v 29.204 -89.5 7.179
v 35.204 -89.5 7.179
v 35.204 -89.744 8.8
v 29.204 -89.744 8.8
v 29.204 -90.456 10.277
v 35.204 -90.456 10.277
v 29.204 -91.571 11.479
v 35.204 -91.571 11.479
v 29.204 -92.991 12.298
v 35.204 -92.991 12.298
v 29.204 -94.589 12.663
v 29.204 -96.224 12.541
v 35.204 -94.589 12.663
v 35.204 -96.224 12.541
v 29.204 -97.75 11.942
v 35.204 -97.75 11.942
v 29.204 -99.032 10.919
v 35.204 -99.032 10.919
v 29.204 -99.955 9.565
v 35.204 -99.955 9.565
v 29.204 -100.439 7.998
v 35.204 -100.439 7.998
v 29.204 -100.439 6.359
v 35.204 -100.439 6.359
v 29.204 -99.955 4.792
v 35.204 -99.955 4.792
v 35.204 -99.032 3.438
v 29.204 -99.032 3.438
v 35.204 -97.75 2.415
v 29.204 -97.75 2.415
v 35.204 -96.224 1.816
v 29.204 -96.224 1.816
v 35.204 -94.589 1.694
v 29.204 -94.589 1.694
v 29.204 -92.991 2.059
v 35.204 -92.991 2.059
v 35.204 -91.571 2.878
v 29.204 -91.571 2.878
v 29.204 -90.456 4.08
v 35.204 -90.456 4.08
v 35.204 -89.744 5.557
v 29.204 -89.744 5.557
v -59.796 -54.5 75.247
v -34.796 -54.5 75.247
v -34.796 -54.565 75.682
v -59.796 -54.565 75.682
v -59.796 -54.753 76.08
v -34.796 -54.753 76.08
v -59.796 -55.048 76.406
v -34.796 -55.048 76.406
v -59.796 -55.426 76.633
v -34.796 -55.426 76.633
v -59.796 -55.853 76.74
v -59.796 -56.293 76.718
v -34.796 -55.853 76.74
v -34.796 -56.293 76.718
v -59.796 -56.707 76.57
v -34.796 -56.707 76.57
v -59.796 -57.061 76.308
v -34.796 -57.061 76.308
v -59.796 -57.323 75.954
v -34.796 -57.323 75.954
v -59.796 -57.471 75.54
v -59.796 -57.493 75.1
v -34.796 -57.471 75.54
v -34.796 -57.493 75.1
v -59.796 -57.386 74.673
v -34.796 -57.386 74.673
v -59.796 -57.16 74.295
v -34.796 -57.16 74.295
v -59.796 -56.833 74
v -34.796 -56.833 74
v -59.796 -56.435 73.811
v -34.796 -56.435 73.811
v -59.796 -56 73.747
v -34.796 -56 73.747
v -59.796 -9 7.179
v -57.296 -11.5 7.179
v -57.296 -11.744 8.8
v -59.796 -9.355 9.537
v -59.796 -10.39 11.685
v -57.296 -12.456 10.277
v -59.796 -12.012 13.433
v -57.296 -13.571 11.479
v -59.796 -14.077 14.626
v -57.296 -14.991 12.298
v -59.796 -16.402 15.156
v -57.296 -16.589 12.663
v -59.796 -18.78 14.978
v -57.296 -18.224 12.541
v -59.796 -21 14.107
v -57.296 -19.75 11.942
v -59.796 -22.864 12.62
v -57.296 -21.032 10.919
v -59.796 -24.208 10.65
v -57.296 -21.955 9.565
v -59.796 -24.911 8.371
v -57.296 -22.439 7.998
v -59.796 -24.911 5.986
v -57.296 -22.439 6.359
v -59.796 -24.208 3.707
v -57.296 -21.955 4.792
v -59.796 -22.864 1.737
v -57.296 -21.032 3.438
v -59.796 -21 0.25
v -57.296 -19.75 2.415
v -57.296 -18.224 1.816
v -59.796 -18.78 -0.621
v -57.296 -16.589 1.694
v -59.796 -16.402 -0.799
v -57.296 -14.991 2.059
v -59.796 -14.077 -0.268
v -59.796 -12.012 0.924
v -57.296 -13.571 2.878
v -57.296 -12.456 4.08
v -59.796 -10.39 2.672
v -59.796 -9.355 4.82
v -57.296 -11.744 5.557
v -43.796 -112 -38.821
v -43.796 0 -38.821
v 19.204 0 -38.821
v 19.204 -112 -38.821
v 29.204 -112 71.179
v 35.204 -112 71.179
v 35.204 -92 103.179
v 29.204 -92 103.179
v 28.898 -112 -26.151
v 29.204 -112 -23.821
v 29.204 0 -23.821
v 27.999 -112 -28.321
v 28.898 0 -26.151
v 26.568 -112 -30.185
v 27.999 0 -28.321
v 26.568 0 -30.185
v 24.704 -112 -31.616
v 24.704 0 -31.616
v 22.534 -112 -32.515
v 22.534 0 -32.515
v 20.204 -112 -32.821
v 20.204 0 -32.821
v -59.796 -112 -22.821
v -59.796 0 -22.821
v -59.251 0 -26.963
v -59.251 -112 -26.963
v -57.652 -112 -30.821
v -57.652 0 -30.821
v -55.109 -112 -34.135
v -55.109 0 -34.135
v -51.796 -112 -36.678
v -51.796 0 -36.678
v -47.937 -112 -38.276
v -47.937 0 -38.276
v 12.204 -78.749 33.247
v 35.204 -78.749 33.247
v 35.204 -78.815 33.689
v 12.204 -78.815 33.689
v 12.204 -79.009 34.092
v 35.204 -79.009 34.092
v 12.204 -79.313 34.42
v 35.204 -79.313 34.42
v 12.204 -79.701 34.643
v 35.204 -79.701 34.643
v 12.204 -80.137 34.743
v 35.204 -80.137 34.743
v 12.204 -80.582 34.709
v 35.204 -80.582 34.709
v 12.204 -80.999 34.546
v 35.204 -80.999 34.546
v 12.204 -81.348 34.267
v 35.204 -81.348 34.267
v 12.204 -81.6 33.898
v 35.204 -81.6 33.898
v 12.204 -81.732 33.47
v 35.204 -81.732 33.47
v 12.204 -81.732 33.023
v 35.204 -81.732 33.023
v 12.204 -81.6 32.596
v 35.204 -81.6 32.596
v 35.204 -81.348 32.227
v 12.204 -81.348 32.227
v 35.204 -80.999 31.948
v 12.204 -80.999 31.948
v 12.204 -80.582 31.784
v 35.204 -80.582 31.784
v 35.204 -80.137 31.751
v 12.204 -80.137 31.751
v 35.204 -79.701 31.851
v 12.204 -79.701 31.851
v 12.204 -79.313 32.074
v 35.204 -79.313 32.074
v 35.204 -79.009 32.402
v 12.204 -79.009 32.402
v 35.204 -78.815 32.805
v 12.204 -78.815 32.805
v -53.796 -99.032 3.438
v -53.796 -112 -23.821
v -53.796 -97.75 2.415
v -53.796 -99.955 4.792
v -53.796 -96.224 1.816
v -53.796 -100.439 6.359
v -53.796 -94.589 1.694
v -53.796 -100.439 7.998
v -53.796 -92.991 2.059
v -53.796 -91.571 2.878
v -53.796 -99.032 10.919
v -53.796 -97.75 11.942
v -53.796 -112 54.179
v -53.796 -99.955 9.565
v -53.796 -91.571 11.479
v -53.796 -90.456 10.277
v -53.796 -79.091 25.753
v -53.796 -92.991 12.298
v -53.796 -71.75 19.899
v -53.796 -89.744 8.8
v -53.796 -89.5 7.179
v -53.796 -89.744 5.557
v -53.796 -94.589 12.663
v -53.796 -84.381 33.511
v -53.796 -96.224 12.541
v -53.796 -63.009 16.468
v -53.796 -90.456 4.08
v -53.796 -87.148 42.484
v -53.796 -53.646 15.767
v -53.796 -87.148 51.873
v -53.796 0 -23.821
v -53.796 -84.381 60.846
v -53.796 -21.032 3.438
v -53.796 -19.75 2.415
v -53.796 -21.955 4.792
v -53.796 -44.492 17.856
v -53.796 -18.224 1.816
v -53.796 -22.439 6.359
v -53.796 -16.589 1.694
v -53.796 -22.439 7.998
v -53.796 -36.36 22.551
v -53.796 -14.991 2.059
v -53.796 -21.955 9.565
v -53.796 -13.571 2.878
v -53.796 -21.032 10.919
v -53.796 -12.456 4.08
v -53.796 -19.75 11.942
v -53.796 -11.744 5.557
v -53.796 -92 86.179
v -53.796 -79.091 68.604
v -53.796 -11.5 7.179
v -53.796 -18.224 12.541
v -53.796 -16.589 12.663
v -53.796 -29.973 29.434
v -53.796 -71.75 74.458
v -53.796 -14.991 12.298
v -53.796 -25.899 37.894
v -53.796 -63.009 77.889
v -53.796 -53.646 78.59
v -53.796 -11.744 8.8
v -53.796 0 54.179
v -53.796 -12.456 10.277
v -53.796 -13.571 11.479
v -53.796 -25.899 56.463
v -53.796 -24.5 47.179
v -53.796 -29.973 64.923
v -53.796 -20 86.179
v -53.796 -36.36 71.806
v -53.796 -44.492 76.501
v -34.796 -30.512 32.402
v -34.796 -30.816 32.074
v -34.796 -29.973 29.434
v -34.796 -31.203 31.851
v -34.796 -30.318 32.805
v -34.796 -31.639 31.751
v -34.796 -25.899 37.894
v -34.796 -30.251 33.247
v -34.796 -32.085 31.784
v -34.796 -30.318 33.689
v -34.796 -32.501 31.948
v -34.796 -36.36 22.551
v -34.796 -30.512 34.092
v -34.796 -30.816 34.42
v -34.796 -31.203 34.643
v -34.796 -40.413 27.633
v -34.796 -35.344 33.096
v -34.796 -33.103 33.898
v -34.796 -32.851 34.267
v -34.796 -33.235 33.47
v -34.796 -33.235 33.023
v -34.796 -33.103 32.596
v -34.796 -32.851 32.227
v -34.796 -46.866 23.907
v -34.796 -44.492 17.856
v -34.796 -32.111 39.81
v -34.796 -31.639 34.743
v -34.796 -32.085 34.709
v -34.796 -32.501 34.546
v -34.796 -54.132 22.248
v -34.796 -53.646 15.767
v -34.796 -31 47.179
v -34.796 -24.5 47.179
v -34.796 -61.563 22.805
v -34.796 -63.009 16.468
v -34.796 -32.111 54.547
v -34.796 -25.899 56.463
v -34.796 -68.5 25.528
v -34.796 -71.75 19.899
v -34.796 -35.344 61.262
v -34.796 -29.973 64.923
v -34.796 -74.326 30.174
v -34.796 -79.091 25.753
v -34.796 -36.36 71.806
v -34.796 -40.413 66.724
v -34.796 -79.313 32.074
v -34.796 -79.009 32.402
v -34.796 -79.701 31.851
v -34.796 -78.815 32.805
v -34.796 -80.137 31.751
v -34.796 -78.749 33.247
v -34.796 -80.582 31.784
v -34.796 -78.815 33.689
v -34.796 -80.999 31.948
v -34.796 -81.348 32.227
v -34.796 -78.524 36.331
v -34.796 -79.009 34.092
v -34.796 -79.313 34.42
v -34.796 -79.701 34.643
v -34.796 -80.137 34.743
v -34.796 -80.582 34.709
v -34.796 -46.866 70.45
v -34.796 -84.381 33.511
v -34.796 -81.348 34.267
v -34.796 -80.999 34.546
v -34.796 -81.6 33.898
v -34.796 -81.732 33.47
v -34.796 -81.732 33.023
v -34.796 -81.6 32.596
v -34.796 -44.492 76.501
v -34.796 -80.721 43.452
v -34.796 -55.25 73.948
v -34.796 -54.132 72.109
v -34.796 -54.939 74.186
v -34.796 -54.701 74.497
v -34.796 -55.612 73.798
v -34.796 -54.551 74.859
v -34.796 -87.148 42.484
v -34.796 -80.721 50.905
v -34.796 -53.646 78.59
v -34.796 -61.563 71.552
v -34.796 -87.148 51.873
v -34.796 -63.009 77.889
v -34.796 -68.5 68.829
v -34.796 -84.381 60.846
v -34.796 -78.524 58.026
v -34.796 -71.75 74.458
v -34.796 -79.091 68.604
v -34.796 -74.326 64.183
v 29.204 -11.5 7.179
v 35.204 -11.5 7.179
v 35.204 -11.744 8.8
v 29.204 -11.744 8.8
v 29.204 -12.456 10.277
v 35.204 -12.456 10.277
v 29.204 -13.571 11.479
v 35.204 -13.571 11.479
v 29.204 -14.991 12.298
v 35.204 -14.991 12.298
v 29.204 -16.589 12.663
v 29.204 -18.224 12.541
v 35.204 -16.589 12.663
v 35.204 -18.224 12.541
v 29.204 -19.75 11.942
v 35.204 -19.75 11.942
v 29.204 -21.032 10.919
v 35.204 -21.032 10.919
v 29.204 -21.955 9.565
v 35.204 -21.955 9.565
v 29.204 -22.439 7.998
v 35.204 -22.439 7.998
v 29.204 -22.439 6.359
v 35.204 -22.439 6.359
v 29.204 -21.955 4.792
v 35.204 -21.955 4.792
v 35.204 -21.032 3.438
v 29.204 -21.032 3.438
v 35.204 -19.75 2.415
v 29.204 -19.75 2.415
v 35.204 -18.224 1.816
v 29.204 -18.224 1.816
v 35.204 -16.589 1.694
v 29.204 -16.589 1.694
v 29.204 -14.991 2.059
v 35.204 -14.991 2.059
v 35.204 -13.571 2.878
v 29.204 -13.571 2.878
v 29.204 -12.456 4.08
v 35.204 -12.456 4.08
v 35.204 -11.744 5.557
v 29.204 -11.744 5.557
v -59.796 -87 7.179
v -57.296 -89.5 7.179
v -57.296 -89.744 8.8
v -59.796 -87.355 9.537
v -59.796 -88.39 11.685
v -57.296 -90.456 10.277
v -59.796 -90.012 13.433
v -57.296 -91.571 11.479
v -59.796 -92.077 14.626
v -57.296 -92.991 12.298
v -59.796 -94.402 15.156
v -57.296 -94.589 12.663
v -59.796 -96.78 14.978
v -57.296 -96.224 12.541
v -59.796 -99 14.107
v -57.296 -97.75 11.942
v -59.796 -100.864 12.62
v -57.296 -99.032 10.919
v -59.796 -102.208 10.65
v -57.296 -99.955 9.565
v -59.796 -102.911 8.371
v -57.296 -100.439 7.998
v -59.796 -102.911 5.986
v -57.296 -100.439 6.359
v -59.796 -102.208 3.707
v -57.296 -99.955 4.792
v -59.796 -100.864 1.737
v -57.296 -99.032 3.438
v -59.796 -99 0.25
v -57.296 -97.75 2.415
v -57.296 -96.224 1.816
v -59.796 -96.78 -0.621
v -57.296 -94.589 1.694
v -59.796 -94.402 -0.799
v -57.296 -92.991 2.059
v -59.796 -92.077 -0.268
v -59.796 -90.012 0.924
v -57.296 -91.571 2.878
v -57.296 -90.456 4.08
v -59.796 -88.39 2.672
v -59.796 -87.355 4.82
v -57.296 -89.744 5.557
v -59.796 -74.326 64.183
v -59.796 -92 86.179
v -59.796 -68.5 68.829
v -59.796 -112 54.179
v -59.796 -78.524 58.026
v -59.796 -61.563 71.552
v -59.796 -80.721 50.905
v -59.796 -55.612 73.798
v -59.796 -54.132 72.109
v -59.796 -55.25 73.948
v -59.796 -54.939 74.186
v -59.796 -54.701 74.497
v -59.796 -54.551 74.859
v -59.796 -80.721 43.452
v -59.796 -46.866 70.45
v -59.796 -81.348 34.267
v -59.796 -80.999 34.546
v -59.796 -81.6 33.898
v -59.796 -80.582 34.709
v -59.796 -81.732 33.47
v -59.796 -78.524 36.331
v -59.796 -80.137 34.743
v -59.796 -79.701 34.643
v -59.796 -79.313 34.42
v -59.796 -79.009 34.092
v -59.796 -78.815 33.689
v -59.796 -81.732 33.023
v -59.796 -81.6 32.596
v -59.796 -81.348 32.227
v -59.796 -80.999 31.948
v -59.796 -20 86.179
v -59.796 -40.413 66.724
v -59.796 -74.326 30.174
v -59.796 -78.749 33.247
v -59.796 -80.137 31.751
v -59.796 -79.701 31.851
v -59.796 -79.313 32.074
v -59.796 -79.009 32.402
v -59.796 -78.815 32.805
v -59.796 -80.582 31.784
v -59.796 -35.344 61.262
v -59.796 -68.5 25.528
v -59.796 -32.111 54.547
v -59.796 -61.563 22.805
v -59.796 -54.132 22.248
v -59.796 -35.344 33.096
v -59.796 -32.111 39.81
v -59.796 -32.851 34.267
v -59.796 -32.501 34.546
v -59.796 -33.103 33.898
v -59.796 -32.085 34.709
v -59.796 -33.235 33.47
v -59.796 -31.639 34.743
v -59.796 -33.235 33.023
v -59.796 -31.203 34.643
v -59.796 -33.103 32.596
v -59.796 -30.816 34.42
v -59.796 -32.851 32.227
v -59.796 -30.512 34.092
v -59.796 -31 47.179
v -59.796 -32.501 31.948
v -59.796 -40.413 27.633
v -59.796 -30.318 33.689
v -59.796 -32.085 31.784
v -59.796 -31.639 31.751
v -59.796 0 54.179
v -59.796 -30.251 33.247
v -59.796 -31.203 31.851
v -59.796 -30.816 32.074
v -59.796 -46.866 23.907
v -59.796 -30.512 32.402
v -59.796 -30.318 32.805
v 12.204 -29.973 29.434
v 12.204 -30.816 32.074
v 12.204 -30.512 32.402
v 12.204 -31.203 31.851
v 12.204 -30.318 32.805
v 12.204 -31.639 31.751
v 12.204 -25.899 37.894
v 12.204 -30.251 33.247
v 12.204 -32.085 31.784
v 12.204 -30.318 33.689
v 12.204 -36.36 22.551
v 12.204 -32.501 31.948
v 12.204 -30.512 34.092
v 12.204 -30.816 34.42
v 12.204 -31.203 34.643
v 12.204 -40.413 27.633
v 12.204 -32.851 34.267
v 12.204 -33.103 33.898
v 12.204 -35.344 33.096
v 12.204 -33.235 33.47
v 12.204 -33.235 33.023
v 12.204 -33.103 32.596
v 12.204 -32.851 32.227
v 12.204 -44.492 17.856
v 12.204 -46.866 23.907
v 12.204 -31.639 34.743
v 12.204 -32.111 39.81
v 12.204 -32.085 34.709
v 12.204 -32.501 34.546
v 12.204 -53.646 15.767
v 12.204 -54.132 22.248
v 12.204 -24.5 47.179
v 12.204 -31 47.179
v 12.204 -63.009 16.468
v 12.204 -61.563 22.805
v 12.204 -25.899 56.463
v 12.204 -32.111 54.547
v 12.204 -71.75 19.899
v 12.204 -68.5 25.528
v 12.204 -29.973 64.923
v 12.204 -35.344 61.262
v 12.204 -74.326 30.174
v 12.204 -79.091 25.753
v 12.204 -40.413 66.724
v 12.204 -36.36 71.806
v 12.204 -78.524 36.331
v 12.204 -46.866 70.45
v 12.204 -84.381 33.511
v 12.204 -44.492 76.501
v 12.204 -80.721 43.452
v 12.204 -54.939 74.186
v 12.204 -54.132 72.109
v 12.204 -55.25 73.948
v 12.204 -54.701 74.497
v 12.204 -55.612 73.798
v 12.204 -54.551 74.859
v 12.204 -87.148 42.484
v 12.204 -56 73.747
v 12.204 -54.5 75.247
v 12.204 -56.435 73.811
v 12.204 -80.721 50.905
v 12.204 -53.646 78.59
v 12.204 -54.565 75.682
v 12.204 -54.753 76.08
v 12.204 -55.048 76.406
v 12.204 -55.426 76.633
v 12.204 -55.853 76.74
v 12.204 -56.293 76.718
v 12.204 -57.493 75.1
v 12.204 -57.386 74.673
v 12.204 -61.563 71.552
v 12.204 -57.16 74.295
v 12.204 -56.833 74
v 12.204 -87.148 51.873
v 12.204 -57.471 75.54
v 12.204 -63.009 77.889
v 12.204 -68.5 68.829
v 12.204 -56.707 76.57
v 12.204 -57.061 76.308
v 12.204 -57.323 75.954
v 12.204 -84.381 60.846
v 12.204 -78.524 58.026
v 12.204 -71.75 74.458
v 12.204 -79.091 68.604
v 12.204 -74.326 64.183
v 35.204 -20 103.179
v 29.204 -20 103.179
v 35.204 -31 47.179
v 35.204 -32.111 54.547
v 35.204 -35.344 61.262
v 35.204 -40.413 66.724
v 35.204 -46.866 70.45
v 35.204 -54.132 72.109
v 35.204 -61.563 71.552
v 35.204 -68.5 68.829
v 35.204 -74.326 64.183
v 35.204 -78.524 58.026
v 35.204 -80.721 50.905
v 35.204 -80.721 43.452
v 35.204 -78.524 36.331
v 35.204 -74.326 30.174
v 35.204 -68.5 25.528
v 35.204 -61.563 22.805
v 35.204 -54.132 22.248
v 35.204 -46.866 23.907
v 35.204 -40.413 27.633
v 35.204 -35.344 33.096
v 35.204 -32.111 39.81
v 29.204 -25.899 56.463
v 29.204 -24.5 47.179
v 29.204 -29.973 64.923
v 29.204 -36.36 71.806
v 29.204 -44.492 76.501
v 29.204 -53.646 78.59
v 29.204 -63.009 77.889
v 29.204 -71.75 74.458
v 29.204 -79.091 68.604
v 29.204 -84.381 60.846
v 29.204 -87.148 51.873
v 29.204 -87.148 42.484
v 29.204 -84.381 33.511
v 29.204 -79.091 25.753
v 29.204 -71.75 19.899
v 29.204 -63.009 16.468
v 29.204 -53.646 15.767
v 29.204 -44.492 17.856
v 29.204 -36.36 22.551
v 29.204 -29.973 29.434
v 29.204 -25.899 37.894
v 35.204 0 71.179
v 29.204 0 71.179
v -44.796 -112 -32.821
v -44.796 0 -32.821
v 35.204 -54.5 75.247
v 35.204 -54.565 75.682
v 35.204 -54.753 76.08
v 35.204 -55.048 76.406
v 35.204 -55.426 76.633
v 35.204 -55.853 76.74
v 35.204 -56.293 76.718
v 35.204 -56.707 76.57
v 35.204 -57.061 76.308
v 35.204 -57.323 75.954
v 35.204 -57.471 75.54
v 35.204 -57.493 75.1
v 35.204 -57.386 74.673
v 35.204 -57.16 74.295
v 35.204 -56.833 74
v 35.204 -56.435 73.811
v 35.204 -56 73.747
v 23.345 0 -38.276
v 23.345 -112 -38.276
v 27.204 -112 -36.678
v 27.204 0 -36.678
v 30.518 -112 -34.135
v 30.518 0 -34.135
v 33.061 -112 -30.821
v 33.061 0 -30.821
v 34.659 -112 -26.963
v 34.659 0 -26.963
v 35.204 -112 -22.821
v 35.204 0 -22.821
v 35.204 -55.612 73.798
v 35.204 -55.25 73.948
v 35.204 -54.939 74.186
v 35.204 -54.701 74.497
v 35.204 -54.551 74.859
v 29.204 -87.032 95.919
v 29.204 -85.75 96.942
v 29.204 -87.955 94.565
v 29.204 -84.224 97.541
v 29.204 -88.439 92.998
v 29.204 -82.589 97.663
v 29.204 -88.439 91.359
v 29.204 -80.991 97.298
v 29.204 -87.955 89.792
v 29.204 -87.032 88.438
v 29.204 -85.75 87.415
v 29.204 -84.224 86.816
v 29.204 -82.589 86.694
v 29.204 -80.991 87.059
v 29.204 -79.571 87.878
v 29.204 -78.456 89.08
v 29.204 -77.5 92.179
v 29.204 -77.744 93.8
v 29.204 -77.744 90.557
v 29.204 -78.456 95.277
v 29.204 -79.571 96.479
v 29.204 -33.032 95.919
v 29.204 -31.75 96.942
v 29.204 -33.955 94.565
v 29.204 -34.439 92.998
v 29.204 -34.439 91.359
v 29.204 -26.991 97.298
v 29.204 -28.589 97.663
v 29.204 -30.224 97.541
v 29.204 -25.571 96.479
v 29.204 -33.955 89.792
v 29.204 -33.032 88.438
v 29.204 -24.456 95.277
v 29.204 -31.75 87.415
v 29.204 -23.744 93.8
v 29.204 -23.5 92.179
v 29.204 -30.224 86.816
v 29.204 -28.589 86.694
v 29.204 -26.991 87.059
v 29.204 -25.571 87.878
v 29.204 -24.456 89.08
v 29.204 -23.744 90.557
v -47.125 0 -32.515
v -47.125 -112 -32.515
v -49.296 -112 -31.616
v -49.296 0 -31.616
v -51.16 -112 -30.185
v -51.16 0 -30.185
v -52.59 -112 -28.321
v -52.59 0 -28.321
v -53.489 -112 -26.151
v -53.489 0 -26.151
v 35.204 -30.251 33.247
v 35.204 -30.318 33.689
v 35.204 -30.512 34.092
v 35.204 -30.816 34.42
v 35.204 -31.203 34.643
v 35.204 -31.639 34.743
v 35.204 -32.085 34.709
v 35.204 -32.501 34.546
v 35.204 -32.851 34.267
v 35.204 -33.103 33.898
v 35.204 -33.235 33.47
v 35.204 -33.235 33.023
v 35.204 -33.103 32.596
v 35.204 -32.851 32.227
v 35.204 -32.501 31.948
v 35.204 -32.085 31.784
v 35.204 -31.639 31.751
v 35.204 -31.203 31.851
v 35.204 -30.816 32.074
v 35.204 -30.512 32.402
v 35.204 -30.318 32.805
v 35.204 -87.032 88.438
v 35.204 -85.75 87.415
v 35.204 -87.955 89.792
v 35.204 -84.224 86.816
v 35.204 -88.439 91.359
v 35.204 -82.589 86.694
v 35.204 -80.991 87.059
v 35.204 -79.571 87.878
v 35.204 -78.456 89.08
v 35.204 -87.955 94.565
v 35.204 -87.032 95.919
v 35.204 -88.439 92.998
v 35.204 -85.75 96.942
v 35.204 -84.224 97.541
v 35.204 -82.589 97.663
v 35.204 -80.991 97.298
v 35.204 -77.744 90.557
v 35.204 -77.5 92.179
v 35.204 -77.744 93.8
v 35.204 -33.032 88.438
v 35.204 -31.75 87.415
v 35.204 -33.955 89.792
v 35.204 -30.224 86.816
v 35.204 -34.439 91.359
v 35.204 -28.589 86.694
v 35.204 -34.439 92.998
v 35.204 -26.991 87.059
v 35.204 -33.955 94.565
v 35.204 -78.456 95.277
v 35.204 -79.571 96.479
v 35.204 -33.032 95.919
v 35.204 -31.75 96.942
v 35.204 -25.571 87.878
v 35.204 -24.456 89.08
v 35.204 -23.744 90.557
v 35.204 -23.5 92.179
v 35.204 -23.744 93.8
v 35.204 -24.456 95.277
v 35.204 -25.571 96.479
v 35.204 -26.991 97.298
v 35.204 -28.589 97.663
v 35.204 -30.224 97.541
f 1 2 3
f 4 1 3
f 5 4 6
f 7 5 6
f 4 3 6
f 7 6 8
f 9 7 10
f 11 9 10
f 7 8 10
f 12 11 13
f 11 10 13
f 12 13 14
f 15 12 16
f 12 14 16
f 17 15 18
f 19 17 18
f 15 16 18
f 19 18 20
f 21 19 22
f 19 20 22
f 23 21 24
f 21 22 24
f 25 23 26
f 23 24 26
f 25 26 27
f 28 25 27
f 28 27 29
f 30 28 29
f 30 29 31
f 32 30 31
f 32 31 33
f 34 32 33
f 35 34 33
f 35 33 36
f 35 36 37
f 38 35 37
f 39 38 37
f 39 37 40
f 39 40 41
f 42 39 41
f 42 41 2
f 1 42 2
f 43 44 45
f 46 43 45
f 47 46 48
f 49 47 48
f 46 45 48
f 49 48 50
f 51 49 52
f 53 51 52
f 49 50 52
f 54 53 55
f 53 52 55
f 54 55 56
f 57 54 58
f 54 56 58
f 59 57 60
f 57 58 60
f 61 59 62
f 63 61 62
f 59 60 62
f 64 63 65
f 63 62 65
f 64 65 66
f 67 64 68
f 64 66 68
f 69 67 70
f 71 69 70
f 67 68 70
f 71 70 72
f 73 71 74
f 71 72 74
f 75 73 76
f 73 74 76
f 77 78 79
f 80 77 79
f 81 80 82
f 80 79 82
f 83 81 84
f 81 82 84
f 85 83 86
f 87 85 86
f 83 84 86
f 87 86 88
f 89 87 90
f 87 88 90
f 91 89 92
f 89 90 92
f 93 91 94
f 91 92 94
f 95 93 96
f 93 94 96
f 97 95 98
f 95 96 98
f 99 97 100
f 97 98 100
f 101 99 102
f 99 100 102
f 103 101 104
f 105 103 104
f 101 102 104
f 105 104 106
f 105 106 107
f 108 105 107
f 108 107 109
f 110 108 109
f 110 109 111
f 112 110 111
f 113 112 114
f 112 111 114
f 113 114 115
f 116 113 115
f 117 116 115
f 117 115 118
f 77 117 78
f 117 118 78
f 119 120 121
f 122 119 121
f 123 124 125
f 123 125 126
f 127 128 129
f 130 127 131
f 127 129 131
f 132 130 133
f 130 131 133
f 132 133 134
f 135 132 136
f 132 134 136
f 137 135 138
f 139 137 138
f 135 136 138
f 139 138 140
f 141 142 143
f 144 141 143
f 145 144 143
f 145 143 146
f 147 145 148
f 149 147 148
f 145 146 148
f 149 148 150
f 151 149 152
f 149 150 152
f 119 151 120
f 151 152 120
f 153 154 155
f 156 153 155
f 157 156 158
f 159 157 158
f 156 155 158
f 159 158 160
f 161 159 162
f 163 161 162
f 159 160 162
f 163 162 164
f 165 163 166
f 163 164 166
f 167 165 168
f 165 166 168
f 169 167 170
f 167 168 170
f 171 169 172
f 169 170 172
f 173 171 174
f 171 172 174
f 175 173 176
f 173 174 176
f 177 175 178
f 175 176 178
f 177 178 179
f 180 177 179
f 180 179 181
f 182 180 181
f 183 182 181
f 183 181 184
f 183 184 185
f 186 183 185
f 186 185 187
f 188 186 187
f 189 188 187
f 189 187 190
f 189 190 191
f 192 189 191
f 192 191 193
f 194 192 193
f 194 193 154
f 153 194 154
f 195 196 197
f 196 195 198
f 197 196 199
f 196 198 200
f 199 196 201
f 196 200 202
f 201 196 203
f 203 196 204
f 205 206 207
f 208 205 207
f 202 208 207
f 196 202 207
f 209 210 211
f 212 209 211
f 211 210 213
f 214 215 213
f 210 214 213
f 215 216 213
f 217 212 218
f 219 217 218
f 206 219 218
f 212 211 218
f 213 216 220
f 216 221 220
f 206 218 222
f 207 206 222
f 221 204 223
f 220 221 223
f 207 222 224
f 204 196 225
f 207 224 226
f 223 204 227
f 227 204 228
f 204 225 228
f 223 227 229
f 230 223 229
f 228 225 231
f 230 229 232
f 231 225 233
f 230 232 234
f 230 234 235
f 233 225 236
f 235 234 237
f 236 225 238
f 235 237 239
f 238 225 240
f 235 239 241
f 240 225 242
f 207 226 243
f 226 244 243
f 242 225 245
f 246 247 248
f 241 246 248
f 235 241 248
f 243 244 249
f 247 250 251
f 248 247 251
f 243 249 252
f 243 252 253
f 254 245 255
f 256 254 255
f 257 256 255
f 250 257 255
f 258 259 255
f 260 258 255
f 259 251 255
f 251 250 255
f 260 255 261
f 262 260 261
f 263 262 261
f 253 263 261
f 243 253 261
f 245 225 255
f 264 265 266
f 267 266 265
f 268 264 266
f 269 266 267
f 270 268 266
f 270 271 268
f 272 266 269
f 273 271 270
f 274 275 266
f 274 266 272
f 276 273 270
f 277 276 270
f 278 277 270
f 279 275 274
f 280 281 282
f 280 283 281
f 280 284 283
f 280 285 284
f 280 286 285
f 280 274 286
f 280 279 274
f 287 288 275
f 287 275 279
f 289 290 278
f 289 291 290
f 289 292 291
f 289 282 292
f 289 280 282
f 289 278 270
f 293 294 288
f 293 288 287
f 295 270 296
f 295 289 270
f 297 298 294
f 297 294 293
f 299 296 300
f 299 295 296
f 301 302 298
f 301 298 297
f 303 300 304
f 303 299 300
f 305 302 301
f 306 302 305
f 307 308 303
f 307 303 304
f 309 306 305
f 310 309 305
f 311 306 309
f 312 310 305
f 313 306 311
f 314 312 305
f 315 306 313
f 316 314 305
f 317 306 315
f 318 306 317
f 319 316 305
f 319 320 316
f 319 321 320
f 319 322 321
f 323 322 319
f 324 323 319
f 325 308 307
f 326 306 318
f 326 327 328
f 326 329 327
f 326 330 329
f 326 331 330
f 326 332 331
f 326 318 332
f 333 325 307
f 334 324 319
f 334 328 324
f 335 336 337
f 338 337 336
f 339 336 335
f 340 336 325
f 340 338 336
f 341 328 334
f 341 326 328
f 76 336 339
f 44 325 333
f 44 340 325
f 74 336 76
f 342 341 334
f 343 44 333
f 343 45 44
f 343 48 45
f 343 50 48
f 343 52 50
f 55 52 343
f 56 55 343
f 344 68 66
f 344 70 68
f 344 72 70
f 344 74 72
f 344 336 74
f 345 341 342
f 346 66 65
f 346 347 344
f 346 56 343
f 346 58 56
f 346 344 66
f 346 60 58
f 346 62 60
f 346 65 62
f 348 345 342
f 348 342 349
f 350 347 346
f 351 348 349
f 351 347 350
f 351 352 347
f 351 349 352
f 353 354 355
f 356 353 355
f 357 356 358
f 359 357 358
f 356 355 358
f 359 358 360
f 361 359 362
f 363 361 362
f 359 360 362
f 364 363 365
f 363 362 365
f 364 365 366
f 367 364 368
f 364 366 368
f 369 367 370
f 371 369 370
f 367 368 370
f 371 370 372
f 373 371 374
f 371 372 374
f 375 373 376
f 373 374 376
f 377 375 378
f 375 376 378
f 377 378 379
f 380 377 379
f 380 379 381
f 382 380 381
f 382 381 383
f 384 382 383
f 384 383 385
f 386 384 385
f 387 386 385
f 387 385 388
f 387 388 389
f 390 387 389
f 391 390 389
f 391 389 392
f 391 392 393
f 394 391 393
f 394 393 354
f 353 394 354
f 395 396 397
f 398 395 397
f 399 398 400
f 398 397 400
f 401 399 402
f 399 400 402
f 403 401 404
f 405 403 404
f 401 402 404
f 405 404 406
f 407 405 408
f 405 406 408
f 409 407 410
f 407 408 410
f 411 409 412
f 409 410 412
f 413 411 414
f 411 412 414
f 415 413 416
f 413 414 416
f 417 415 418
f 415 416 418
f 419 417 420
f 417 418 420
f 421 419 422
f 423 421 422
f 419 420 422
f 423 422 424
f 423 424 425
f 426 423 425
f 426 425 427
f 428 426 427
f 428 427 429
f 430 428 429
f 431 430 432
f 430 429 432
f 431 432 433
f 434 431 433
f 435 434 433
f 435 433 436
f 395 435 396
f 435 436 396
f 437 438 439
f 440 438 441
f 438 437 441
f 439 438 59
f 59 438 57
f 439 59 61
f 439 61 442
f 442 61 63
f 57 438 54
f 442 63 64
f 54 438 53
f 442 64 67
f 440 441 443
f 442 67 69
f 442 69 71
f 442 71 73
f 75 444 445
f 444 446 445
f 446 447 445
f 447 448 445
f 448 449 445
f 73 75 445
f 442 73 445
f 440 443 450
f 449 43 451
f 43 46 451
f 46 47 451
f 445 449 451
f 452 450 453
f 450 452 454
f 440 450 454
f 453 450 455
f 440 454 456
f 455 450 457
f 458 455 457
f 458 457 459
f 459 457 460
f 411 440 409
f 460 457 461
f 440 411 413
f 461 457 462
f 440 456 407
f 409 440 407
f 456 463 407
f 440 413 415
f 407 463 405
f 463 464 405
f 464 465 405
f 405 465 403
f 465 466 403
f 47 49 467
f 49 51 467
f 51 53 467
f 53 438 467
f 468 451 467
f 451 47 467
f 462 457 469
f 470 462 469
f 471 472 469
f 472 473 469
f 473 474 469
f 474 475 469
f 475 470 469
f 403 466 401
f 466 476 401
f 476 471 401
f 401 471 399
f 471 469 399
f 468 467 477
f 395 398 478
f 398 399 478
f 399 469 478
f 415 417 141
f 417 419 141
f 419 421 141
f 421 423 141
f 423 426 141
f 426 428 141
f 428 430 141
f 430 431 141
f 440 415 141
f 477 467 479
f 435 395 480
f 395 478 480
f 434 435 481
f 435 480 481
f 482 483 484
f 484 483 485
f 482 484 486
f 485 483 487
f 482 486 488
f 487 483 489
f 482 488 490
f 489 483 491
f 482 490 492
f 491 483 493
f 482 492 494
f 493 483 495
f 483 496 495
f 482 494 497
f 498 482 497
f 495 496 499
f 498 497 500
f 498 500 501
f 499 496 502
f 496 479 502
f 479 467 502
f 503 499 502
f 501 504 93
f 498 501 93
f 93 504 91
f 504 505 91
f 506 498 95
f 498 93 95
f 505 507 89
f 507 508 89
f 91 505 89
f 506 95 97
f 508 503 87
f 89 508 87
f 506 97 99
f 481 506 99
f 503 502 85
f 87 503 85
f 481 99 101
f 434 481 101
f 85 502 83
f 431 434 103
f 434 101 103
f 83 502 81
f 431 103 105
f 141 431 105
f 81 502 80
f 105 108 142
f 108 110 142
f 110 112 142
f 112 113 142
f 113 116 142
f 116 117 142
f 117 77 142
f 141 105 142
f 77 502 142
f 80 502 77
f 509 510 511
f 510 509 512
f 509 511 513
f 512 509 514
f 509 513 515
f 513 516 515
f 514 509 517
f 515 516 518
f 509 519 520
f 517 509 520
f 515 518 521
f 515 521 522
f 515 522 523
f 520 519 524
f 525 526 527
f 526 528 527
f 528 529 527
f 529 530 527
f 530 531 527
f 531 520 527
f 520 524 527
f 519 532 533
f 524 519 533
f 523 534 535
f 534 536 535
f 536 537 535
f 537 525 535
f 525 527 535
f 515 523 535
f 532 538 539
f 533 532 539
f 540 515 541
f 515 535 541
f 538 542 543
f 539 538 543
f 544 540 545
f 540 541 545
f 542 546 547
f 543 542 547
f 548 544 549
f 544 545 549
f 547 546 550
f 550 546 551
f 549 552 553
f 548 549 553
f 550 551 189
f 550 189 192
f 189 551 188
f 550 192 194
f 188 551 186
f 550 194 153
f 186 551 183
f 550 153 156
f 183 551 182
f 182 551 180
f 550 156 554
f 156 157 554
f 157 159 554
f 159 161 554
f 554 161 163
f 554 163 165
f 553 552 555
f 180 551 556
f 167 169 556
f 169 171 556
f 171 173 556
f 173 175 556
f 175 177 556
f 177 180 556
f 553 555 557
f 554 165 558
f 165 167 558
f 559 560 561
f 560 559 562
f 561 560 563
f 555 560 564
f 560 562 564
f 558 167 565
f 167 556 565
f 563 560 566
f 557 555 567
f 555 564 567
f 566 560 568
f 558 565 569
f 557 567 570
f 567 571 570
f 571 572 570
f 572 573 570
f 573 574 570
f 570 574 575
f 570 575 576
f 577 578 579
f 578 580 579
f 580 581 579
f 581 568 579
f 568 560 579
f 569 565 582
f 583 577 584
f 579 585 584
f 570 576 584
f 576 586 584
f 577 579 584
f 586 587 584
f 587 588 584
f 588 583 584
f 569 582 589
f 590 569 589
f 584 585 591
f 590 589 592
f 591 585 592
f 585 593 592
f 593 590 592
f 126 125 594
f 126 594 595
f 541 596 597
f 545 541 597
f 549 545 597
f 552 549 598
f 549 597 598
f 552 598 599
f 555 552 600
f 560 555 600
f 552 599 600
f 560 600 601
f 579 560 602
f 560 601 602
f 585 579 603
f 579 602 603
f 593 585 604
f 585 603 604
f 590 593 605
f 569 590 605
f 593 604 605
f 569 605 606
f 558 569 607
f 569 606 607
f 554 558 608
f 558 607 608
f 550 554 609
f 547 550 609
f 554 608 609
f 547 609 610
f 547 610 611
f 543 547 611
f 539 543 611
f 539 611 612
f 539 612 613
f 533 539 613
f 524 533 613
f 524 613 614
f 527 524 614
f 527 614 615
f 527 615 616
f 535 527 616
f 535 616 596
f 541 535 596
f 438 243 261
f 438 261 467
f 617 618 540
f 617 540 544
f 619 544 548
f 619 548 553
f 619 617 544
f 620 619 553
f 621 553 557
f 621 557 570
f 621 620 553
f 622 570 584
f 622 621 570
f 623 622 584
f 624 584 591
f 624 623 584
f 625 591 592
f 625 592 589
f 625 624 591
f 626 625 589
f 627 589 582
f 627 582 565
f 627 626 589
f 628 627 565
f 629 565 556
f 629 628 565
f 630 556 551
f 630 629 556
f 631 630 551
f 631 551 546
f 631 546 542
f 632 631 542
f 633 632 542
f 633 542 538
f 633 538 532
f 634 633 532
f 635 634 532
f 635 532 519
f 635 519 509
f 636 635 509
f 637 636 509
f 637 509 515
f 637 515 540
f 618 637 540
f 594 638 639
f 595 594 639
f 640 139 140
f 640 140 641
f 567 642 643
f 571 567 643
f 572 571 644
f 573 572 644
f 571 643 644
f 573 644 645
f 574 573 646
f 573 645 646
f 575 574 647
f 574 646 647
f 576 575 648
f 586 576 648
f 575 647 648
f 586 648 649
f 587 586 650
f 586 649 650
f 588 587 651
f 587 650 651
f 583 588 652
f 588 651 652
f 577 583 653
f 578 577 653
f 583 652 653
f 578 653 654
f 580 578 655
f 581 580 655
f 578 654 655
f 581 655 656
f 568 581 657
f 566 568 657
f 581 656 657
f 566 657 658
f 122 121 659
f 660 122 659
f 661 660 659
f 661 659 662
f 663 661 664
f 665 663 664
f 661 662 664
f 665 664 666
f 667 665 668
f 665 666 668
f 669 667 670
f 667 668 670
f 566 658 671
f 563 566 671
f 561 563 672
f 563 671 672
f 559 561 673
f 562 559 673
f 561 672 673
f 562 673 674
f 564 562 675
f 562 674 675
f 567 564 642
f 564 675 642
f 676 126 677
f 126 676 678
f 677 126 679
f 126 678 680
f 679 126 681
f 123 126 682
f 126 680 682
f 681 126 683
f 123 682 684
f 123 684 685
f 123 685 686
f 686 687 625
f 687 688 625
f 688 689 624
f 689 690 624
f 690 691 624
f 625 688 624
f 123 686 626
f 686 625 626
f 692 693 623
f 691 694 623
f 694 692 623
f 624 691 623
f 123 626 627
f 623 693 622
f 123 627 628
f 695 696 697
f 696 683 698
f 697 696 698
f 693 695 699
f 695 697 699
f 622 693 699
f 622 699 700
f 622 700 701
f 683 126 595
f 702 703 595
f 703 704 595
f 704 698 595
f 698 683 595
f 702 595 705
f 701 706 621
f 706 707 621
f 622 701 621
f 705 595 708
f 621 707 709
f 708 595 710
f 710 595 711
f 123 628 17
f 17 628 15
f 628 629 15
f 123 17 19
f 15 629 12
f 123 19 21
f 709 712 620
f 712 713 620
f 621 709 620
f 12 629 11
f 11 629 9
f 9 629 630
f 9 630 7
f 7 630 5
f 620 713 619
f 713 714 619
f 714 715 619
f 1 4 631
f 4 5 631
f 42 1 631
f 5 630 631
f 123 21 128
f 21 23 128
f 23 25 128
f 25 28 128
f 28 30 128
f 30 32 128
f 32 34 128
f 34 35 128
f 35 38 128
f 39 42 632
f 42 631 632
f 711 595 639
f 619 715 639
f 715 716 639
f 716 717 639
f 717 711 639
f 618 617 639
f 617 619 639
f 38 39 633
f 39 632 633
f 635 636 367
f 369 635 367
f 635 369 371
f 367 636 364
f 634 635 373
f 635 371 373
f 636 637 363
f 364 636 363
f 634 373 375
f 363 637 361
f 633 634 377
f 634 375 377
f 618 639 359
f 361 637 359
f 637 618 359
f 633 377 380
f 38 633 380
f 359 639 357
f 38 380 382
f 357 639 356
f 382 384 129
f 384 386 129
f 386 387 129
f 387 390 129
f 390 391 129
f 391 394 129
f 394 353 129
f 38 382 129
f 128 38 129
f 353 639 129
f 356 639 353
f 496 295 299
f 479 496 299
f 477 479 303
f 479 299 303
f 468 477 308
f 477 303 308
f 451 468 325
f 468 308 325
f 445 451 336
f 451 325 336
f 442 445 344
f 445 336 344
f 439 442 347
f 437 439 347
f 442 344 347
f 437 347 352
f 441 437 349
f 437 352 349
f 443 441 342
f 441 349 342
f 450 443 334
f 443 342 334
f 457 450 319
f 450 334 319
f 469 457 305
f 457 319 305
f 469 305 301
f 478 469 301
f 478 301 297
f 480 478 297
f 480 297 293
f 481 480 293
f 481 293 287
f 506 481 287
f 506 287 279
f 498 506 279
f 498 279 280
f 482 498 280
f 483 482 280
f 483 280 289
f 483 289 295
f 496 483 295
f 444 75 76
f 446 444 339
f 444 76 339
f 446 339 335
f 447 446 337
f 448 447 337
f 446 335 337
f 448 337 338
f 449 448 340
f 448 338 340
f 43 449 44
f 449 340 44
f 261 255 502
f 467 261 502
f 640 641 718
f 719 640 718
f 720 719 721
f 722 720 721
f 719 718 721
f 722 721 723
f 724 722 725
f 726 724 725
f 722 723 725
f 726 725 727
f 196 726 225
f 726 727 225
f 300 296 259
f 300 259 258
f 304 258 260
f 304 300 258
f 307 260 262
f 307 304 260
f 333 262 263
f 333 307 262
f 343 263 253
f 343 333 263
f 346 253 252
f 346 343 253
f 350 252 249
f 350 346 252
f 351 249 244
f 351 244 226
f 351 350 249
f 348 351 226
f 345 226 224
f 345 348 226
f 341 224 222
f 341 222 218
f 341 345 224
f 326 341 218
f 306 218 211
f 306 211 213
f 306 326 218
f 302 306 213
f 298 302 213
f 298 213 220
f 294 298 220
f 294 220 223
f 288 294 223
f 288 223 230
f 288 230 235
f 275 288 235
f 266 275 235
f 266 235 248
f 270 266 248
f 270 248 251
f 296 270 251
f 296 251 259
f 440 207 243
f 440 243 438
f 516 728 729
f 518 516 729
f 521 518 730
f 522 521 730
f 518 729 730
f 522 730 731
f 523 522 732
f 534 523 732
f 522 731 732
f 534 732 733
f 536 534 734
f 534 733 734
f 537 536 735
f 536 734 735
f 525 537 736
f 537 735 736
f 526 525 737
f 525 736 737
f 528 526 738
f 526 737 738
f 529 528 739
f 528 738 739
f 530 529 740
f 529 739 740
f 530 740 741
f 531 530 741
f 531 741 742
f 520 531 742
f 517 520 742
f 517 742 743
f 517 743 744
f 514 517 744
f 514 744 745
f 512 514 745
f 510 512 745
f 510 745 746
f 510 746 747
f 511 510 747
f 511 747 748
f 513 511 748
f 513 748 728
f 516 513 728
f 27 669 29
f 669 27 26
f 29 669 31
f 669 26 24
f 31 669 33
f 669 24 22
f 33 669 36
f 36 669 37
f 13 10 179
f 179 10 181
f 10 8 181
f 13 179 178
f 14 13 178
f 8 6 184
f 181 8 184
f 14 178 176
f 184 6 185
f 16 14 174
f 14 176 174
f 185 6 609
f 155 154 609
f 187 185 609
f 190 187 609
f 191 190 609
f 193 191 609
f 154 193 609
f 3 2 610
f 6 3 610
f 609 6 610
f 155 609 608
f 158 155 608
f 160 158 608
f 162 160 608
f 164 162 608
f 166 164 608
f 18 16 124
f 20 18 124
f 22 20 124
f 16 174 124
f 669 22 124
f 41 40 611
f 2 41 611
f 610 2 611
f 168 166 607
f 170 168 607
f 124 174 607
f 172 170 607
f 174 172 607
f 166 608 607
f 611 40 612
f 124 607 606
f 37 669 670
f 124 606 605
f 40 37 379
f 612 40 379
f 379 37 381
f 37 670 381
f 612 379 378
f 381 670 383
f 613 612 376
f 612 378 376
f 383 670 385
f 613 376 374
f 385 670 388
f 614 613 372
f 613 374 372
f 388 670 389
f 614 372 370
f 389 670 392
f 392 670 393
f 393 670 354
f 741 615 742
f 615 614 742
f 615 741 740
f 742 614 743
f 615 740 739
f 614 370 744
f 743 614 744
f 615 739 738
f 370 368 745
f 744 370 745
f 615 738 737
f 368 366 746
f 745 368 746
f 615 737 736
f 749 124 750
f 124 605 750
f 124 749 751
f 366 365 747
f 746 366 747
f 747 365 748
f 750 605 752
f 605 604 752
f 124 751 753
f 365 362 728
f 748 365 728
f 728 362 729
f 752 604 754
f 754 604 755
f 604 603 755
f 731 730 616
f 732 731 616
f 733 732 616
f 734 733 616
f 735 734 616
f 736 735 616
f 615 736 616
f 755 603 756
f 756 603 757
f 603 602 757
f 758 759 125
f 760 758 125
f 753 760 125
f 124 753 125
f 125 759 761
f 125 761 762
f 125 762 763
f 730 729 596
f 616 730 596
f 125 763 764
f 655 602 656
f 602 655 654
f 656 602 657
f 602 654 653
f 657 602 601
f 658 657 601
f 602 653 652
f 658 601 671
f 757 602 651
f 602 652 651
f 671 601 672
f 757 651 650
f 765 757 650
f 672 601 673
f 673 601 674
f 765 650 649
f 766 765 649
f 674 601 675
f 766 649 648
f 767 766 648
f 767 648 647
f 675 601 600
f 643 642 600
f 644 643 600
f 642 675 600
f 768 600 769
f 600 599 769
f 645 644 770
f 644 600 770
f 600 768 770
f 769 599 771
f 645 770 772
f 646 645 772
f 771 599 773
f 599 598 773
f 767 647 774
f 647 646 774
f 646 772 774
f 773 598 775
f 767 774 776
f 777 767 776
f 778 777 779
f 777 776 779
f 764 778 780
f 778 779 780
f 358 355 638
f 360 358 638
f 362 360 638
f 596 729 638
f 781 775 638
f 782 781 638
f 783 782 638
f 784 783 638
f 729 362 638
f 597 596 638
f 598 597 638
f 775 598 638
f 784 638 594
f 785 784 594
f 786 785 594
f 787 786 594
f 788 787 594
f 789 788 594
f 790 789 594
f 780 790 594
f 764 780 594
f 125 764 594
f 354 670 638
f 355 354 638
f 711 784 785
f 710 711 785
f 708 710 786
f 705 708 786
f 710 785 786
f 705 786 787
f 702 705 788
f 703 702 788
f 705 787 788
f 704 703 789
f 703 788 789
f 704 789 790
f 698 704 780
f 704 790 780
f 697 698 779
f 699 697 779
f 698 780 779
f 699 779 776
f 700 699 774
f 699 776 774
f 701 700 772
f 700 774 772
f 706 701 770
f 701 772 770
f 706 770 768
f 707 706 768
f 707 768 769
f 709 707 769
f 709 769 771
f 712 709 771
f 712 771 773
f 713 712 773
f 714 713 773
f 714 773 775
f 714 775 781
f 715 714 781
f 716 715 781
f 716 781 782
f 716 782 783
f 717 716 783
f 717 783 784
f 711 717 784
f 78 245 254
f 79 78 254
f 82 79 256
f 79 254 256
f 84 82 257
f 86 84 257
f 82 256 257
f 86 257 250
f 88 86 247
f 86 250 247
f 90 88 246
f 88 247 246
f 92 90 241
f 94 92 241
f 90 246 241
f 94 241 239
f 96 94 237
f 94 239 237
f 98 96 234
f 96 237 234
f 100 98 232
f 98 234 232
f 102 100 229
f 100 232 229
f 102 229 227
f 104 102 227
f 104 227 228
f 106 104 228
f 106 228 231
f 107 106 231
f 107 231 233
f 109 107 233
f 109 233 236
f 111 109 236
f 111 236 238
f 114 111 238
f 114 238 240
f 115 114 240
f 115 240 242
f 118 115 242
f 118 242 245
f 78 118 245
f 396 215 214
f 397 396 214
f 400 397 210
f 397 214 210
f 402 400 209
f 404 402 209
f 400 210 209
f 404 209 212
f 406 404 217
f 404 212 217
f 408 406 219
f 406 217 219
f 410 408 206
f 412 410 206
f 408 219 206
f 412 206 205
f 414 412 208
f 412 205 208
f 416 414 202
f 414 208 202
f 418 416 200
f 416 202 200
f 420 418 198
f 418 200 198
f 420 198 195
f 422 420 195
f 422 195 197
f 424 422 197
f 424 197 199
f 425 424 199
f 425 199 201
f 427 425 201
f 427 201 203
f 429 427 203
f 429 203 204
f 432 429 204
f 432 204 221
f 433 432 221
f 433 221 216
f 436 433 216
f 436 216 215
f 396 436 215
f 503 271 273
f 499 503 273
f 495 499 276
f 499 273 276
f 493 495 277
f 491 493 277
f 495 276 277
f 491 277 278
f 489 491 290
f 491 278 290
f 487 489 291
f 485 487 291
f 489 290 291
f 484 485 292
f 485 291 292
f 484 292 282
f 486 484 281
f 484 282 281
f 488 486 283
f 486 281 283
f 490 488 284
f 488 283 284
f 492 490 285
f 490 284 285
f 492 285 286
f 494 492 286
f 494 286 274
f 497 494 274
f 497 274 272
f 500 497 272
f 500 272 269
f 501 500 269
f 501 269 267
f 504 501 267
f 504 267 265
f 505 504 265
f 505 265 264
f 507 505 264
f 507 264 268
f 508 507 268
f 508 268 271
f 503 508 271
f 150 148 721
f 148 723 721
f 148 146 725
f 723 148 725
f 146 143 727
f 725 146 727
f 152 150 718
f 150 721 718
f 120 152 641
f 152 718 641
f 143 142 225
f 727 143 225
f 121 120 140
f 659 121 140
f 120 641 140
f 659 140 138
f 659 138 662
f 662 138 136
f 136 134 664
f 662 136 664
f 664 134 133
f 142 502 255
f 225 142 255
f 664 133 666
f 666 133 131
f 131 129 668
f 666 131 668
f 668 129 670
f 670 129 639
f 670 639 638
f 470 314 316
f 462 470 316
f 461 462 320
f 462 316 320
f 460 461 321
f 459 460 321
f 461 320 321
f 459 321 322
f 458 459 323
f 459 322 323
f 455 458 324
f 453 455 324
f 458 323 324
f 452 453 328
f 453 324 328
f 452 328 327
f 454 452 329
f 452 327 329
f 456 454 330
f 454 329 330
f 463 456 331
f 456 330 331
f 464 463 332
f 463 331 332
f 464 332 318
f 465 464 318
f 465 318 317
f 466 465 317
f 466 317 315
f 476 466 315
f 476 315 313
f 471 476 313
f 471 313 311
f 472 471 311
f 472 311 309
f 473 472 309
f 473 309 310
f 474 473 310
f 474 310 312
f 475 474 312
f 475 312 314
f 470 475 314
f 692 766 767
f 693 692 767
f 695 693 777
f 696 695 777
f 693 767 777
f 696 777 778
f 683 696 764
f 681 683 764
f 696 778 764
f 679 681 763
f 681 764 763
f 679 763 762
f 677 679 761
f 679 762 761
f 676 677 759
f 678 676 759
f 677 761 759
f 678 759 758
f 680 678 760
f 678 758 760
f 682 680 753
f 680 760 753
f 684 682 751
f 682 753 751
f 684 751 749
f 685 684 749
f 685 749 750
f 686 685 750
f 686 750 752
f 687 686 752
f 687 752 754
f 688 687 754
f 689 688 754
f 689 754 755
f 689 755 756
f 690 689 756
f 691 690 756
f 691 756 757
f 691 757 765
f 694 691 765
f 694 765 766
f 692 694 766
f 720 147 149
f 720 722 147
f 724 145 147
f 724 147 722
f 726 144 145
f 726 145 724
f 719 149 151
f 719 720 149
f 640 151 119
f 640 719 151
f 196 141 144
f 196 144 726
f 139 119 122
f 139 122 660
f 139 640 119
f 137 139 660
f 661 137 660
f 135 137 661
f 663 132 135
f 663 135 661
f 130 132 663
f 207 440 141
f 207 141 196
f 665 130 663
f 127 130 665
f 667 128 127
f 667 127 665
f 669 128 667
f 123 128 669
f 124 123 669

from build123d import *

# Parameters (mm, degrees)
F1_DEPTH    = 112
F2_R        = 25
F3_DEPTH    = 185
F2_R_2      = 31.5
F5_DEPTH    = 184
F6_DEPTH    = 95
F7_W        = 47
F7_H        = 100
F8_DEPTH    = 159
F9_R        = 5.5
F10_DEPTH   = 157.2
F9_R_2      = 1.5
F11_DEPTH   = 154.4
F12_SIZE2   = 32
F12_SIZE    = 20
F12_2_SIZE2 = 32
F12_2_SIZE  = 20
F13_SIZE    = 2.5


with BuildPart() as f1:
    # F0 (on Front) → F1 (new body)
    with BuildSketch(Plane.XZ):
        with BuildLine():
            ThreePointArc((-59.7957043946, -22.8214863997), (-55.1094128936, -34.1351948987), (-43.7957043946, -38.8214863997))
            Line((-43.7957043946, -38.8214863997), (19.2042956054, -38.8214863997))
            ThreePointArc((19.2042956054, -38.8214863997), (30.5180041044, -34.1351948987), (35.2042956054, -22.8214863997))
            Line((35.2042956054, -22.8214863997), (35.2042956054, 103.1785136003))
            Line((35.2042956054, 103.1785136003), (29.2042956054, 103.1785136003))
            Line((29.2042956054, 103.1785136003), (29.2042956054, 87.1785136003))
            Line((29.2042956054, 87.1785136003), (29.2042956054, -23.8214863997))
            ThreePointArc((29.2042956054, -23.8214863997), (26.5682566361, -30.1854474304), (20.2042956054, -32.8214863997))
            Line((20.2042956054, -32.8214863997), (-44.7957043946, -32.8214863997))
            ThreePointArc((-44.7957043946, -32.8214863997), (-51.1596654253, -30.1854474304), (-53.7957043946, -23.8214863997))
            Line((-53.7957043946, -23.8214863997), (-53.7957043946, 86.1785136003))
            Line((-53.7957043946, 86.1785136003), (-59.7957043946, 86.1785136003))
            Line((-59.7957043946, 86.1785136003), (-59.7957043946, -22.8214863997))
        make_face()
    extrude(amount=F1_DEPTH)

    # F2 (on face) → F3 (cut)
    with BuildSketch(Plane.YZ.offset(35.2042956054)):
        with Locations((-56, 47.1785136003)):
            Circle(F2_R)
    extrude(amount=-F3_DEPTH, mode=Mode.SUBTRACT)

    # F2 (on face) → F5 (cut)
    with BuildSketch(Plane.YZ.offset(35.2042956054)):
        with Locations((-56, 47.1785136003)):
            Circle(F2_R_2)
        with Locations((-56, 47.1785136003)):
            Circle(F2_R, mode=Mode.SUBTRACT)
    extrude(amount=-F5_DEPTH, mode=Mode.SUBTRACT)

    # F2 (on face) → F6 (join)
    with BuildSketch(Plane.YZ.offset(35.2042956054)):
        with Locations((-56, 47.1785136003)):
            Circle(F2_R_2)
        with Locations((-56, 47.1785136003)):
            Circle(F2_R, mode=Mode.SUBTRACT)
    extrude(amount=-F6_DEPTH)

    # F7 (on offset) → F8 (cut)
    with BuildSketch(Plane.XZ.offset(137)):
        with Locations((-11.2957043946, 29.1785136003)):
            Rectangle(F7_W, F7_H)
    extrude(amount=-F8_DEPTH, mode=Mode.SUBTRACT)

    # F9 (on face) → F10 (cut)
    with BuildSketch(Plane.YZ.offset(35.2042956054)):
        with Locations((-83, 92.1785136003)):
            Circle(F9_R)
        with Locations((-29, 92.1785136003)):
            Circle(F9_R)
        with Locations((-95, 7.1785136003)):
            Circle(F9_R)
        with Locations((-17, 7.1785136003)):
            Circle(F9_R)
    extrude(amount=-F10_DEPTH, mode=Mode.SUBTRACT)

    # F9 (on face) → F11 (cut)
    with BuildSketch(Plane.YZ.offset(35.2042956054)):
        with Locations((-31.751288694, 33.2468845546)):
            Circle(F9_R_2)
        with Locations((-80.248711306, 33.2468845546)):
            Circle(F9_R_2)
        with BuildLine():
            ThreePointArc((-56, 73.7468845546), (-54.9393398282, 74.1862243828), (-54.5, 75.2468845546))
            ThreePointArc((-54.5, 75.2468845546), (-57.0606601718, 76.3075447264), (-56, 73.7468845546))
        make_face()
    extrude(amount=-F11_DEPTH, mode=Mode.SUBTRACT)

    # F12
    f12_edges = [f1.edges().sort_by_distance(p)[0] for p in [
        (-56.795704, 0, 86.178514),
        (-56.795704, -112, 86.178514),
    ]]
    f12_side = f1.faces().sort_by_distance((-56.795704, -56, 86.178514))[0]
    chamfer(f12_edges, length=F12_SIZE, length2=F12_SIZE2, reference=f12_side)

    # F12#2
    f12_2_edges = [f1.edges().sort_by_distance(p)[0] for p in [
        (32.204296, 0, 103.178514),
        (32.204296, -112, 103.178514),
    ]]
    f12_2_side = f1.faces().sort_by_distance((32.204296, -56, 103.178514))[0]
    chamfer(f12_2_edges, length=F12_2_SIZE, length2=F12_2_SIZE2, reference=f12_2_side)

    # F13
    f13_edges = [f1.edges().sort_by_distance(p)[0] for p in [
        (-59.795704, -22.5, 7.178514),
        (-59.795704, -100.5, 7.178514),
    ]]
    chamfer(f13_edges, length=F13_SIZE)


solid = f1.part
